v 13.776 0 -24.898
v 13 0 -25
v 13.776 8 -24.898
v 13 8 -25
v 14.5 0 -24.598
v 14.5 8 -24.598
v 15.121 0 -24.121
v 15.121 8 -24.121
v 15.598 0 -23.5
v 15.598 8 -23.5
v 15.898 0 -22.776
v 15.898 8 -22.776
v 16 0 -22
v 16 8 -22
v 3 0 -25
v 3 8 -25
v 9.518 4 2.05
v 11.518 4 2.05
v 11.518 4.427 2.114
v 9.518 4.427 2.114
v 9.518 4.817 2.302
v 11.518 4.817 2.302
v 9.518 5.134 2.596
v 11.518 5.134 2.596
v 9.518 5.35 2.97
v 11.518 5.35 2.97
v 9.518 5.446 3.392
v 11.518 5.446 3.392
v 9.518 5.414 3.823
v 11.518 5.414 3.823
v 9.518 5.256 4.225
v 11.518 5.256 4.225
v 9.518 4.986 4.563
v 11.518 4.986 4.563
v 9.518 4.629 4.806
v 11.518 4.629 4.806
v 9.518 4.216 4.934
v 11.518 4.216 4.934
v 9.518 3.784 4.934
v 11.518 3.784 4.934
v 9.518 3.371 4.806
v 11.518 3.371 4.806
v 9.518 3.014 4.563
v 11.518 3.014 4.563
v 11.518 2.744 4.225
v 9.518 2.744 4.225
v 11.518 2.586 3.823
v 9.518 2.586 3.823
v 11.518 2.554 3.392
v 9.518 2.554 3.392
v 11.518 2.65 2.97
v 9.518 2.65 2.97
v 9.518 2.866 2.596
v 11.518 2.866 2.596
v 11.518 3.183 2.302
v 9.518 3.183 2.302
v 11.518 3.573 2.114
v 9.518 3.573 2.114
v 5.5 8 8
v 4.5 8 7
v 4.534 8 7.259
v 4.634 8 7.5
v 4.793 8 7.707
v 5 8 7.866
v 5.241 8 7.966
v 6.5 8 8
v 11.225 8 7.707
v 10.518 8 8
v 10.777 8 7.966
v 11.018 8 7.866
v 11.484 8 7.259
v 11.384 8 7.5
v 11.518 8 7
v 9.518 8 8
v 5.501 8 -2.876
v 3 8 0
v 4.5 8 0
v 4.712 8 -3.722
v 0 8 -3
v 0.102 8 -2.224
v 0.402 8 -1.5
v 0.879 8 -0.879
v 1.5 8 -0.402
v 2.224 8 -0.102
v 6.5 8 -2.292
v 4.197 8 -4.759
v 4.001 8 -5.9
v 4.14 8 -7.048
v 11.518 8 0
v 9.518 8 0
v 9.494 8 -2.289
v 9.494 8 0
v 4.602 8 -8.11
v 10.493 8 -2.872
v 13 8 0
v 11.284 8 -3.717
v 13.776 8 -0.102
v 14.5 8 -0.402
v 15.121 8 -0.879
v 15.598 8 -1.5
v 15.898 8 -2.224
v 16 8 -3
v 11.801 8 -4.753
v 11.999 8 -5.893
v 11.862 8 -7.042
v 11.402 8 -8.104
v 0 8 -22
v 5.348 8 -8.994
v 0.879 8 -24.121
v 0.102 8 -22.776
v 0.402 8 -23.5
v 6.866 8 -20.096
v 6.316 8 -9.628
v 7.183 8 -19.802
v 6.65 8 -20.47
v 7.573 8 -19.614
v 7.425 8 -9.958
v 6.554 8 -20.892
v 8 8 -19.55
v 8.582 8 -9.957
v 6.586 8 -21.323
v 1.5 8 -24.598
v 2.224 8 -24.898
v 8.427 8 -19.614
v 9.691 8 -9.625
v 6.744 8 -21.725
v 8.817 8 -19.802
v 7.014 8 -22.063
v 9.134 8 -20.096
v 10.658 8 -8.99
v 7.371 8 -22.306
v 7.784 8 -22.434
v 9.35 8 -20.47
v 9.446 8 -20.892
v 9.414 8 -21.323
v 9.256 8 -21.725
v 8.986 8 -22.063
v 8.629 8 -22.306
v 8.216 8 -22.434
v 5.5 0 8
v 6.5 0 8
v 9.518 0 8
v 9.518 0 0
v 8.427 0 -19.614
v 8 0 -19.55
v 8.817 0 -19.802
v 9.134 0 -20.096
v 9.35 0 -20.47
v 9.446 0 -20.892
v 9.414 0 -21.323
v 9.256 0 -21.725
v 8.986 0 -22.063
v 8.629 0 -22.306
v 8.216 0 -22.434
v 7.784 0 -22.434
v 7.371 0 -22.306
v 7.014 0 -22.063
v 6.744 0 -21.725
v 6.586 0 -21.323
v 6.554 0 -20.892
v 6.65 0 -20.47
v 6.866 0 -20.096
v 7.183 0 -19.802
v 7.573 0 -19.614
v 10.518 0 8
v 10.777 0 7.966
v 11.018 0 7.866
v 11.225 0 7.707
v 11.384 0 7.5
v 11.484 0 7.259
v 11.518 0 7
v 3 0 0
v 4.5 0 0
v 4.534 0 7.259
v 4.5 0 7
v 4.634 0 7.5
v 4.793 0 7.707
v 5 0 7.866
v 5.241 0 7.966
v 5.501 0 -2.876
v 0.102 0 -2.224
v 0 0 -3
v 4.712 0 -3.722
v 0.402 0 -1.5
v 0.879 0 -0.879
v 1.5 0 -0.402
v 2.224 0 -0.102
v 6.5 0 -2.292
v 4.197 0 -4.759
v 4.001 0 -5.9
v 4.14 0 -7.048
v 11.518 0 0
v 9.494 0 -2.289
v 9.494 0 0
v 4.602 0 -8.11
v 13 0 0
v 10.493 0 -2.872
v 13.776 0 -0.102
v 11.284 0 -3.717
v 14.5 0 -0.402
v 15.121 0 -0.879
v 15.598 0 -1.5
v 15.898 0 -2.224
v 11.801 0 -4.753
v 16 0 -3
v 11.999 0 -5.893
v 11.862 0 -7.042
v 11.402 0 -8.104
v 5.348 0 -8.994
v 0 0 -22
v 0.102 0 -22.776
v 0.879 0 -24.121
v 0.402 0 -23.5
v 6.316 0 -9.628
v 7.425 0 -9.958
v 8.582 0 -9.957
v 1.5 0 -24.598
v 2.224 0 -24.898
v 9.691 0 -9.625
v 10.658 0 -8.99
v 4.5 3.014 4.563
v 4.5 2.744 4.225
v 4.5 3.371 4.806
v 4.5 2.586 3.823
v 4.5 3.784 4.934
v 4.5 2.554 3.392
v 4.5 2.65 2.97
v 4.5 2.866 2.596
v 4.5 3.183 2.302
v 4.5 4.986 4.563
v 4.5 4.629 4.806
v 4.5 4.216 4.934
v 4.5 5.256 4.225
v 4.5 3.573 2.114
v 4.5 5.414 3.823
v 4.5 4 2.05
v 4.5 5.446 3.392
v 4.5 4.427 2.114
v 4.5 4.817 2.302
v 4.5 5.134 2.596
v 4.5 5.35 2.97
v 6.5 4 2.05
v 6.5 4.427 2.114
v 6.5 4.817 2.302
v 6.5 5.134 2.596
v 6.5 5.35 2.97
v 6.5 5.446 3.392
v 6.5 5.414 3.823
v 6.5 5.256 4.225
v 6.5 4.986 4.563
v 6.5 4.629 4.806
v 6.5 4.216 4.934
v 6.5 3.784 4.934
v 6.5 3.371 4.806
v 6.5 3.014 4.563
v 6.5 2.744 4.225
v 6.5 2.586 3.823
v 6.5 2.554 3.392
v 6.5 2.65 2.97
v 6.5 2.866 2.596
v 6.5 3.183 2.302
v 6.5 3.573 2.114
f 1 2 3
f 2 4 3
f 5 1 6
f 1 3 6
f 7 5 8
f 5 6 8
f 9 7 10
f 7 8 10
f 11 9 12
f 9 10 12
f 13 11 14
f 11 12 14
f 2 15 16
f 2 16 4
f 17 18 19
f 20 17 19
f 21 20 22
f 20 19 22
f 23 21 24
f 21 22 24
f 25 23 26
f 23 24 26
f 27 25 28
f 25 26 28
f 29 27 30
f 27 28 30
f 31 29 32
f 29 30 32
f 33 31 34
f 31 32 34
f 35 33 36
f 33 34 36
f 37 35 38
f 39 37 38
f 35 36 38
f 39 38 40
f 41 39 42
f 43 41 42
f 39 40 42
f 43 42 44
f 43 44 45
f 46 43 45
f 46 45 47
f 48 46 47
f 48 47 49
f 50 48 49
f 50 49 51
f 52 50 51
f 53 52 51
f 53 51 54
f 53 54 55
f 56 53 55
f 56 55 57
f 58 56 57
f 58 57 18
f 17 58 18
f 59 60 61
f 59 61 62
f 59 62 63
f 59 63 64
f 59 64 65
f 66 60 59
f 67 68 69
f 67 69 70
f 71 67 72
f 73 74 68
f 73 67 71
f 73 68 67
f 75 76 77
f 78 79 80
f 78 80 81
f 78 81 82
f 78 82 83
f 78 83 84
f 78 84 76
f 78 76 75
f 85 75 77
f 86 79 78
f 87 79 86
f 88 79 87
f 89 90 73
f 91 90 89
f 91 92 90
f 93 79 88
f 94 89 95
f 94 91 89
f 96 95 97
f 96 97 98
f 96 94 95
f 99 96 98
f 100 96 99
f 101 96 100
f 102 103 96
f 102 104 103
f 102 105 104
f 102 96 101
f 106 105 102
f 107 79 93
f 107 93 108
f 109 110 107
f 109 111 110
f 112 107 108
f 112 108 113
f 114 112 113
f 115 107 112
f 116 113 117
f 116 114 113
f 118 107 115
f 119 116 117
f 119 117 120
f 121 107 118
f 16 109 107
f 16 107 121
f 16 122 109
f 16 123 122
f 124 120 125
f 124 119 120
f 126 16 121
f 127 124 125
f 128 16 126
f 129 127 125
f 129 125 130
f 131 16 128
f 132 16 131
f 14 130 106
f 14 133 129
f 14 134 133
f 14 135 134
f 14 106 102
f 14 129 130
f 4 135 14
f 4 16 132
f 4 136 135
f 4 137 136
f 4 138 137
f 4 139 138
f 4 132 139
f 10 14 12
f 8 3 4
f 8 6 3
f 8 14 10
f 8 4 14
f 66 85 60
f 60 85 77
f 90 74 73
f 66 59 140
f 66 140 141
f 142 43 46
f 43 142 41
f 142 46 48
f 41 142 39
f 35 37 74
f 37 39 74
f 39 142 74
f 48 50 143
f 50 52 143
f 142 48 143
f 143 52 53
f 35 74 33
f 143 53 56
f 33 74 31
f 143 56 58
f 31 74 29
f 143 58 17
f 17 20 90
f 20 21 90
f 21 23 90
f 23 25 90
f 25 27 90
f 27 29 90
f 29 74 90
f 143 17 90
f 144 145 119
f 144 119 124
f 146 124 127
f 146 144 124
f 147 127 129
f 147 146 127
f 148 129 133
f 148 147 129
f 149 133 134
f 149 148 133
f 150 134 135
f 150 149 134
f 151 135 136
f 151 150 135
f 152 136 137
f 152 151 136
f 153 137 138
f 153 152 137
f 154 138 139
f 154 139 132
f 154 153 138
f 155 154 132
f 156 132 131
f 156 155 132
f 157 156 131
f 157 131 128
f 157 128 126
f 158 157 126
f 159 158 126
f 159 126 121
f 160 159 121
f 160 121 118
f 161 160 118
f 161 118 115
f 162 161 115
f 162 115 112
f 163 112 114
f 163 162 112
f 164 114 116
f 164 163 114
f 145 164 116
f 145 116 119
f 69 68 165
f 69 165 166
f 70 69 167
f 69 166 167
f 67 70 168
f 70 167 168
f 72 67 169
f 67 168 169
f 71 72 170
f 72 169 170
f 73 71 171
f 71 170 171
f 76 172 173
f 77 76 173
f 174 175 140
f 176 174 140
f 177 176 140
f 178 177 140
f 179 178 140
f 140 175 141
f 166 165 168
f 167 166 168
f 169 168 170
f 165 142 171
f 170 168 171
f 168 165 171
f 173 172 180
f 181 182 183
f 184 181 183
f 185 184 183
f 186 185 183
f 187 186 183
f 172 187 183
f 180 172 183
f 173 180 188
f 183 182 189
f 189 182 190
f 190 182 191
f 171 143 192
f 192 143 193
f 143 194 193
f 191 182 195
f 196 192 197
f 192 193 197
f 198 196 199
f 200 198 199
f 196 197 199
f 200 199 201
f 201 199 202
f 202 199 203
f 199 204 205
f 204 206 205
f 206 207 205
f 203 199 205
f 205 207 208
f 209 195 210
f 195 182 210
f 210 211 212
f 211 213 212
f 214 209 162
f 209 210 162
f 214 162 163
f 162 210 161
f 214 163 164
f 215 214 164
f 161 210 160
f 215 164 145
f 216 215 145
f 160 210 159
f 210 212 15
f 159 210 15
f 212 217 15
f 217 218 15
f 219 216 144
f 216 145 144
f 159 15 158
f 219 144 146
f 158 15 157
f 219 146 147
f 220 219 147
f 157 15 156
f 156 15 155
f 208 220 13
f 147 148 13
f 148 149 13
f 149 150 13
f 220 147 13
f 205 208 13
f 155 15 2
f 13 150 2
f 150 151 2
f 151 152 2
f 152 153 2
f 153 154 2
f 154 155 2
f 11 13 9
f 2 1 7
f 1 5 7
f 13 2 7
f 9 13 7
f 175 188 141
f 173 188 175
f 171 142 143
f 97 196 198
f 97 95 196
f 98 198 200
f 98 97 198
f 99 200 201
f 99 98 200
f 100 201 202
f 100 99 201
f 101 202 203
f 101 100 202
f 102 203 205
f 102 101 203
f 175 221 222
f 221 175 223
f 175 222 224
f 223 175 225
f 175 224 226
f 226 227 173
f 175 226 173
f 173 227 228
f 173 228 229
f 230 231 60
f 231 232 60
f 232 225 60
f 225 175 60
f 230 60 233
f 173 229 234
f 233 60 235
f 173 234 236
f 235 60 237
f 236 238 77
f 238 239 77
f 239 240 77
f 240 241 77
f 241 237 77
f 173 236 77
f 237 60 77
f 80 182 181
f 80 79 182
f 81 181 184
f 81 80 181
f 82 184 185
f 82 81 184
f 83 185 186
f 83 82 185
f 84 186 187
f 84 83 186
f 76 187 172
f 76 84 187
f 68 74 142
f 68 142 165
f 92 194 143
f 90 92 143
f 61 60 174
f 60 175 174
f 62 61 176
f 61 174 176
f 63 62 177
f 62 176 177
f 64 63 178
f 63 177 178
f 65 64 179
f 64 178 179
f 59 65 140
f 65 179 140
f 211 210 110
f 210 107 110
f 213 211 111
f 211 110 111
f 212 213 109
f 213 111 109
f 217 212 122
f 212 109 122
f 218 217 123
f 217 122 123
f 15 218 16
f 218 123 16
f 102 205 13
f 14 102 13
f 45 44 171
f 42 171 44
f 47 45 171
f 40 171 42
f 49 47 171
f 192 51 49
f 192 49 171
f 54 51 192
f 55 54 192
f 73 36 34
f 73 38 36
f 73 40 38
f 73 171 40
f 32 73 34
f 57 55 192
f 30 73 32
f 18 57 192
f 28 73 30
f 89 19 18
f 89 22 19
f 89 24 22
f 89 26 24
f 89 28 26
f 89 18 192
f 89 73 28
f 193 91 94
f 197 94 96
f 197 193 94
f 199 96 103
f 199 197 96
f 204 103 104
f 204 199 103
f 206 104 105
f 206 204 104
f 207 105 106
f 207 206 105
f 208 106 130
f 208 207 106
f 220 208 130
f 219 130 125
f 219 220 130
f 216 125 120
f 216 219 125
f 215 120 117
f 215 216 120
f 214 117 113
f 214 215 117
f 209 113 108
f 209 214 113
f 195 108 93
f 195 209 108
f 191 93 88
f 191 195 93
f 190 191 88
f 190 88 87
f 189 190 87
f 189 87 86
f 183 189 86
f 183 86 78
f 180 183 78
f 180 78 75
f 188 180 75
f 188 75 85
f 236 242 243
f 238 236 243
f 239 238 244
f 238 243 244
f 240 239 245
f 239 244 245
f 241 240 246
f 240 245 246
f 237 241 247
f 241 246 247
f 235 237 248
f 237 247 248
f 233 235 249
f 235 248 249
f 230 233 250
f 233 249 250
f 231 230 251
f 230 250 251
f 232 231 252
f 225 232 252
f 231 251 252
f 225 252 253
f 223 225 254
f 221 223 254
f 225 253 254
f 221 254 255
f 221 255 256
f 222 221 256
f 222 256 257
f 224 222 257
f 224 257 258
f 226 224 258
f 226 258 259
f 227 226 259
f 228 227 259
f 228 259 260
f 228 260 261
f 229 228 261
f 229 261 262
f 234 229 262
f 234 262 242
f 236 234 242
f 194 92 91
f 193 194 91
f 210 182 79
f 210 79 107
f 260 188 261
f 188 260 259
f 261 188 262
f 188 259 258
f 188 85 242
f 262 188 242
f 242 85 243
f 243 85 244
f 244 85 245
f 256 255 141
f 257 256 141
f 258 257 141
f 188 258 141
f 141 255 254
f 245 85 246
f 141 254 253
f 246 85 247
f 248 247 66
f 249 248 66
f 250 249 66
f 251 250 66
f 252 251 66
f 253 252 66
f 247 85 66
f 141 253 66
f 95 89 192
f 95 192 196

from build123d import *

# Parameters (mm, degrees)
SKETCH1_W           = 16
SKETCH1_H           = 25
SKETCH1_R           = 1.45
SKETCH1_R_2         = 4
BOSS_EXTRUDE1_DEPTH = 8
FILLET1_R           = 3
SKETCH2_W           = 2
SKETCH2_H           = 8
BOSS_EXTRUDE2_DEPTH = 8
FILLET2_R           = 1
FILLET3_R           = 1
CUT_EXTRUDE1_DEPTH  = 31.740852298
SKETCH5_R           = 1.45
CUT_EXTRUDE3_DEPTH  = 29.664809327


with BuildPart() as part:
    # Sketch1 → Boss-Extrude1 (new body)
    with BuildSketch(Plane(origin=(0, 0, 0), x_dir=(1, 0, 0), z_dir=(0, 1, 0))):
        with Locations((8, 12.5)):
            Rectangle(SKETCH1_W, SKETCH1_H)
        with Locations(Location((8, 21, 0), (0, 0, 270))):
            Circle(SKETCH1_R, mode=Mode.SUBTRACT)
        with Locations(Location((8, 6, 0), (0, 0, 270))):
            Circle(SKETCH1_R_2, mode=Mode.SUBTRACT)
    extrude(amount=BOSS_EXTRUDE1_DEPTH)

    # Fillet1
    fillet1_edges = [part.edges().sort_by_distance(p)[0] for p in [
        (0, 4, -25),
        (16, 4, -25),
        (16, 4, 0),
        (0, 4, 0),
    ]]
    fillet(fillet1_edges, radius=FILLET1_R)

    # Sketch2 → Boss-Extrude2 (add, through all)
    with BuildSketch(Plane(origin=(0, 8, 0), x_dir=(1, 0, 0), z_dir=(0, 1, 0))):
        with Locations((5.5, -4)):
            Rectangle(SKETCH2_W, SKETCH2_H)
        with Locations((10.518302555, -4)):
            Rectangle(SKETCH2_W, SKETCH2_H)
    extrude(amount=-BOSS_EXTRUDE2_DEPTH)

    # Fillet2
    fillet2_edges = [part.edges().sort_by_distance(p)[0] for p in [
        (4.5, 4, 8),
    ]]
    fillet(fillet2_edges, radius=FILLET2_R)

    # Fillet3
    fillet3_edges = [part.edges().sort_by_distance(p)[0] for p in [
        (11.518302555, 4, 8),
    ]]
    fillet(fillet3_edges, radius=FILLET3_R)

    # Sketch3 → Cut-Extrude1 (cut, through all)
    with BuildSketch(Plane(origin=(0, 8, 0), x_dir=(1, 0, 0), z_dir=(0, 1, 0))):
        with BuildLine():
            Line((6.5, 2.291900756), (6.5, -1.76134076))
            Line((6.5, -1.76134076), (9.493627756, -1.76134076))
            Line((9.493627756, -1.76134076), (9.493627756, 2.289329423))
            ThreePointArc((9.493627756, 2.289329423), (7.996564259, 2.000001476), (6.5, 2.291900756))
        make_face()
    extrude(amount=-CUT_EXTRUDE1_DEPTH, mode=Mode.SUBTRACT)

    # Sketch5 → Cut-Extrude3 (cut, through all)
    with BuildSketch(Plane(origin=(11.518302555, 0, 0), x_dir=(0, 0, -1), z_dir=(1, 0, 0))):
        with Locations((-3.5, 4)):
            Circle(SKETCH5_R)
    extrude(amount=-CUT_EXTRUDE3_DEPTH, mode=Mode.SUBTRACT)


solid = part.part
